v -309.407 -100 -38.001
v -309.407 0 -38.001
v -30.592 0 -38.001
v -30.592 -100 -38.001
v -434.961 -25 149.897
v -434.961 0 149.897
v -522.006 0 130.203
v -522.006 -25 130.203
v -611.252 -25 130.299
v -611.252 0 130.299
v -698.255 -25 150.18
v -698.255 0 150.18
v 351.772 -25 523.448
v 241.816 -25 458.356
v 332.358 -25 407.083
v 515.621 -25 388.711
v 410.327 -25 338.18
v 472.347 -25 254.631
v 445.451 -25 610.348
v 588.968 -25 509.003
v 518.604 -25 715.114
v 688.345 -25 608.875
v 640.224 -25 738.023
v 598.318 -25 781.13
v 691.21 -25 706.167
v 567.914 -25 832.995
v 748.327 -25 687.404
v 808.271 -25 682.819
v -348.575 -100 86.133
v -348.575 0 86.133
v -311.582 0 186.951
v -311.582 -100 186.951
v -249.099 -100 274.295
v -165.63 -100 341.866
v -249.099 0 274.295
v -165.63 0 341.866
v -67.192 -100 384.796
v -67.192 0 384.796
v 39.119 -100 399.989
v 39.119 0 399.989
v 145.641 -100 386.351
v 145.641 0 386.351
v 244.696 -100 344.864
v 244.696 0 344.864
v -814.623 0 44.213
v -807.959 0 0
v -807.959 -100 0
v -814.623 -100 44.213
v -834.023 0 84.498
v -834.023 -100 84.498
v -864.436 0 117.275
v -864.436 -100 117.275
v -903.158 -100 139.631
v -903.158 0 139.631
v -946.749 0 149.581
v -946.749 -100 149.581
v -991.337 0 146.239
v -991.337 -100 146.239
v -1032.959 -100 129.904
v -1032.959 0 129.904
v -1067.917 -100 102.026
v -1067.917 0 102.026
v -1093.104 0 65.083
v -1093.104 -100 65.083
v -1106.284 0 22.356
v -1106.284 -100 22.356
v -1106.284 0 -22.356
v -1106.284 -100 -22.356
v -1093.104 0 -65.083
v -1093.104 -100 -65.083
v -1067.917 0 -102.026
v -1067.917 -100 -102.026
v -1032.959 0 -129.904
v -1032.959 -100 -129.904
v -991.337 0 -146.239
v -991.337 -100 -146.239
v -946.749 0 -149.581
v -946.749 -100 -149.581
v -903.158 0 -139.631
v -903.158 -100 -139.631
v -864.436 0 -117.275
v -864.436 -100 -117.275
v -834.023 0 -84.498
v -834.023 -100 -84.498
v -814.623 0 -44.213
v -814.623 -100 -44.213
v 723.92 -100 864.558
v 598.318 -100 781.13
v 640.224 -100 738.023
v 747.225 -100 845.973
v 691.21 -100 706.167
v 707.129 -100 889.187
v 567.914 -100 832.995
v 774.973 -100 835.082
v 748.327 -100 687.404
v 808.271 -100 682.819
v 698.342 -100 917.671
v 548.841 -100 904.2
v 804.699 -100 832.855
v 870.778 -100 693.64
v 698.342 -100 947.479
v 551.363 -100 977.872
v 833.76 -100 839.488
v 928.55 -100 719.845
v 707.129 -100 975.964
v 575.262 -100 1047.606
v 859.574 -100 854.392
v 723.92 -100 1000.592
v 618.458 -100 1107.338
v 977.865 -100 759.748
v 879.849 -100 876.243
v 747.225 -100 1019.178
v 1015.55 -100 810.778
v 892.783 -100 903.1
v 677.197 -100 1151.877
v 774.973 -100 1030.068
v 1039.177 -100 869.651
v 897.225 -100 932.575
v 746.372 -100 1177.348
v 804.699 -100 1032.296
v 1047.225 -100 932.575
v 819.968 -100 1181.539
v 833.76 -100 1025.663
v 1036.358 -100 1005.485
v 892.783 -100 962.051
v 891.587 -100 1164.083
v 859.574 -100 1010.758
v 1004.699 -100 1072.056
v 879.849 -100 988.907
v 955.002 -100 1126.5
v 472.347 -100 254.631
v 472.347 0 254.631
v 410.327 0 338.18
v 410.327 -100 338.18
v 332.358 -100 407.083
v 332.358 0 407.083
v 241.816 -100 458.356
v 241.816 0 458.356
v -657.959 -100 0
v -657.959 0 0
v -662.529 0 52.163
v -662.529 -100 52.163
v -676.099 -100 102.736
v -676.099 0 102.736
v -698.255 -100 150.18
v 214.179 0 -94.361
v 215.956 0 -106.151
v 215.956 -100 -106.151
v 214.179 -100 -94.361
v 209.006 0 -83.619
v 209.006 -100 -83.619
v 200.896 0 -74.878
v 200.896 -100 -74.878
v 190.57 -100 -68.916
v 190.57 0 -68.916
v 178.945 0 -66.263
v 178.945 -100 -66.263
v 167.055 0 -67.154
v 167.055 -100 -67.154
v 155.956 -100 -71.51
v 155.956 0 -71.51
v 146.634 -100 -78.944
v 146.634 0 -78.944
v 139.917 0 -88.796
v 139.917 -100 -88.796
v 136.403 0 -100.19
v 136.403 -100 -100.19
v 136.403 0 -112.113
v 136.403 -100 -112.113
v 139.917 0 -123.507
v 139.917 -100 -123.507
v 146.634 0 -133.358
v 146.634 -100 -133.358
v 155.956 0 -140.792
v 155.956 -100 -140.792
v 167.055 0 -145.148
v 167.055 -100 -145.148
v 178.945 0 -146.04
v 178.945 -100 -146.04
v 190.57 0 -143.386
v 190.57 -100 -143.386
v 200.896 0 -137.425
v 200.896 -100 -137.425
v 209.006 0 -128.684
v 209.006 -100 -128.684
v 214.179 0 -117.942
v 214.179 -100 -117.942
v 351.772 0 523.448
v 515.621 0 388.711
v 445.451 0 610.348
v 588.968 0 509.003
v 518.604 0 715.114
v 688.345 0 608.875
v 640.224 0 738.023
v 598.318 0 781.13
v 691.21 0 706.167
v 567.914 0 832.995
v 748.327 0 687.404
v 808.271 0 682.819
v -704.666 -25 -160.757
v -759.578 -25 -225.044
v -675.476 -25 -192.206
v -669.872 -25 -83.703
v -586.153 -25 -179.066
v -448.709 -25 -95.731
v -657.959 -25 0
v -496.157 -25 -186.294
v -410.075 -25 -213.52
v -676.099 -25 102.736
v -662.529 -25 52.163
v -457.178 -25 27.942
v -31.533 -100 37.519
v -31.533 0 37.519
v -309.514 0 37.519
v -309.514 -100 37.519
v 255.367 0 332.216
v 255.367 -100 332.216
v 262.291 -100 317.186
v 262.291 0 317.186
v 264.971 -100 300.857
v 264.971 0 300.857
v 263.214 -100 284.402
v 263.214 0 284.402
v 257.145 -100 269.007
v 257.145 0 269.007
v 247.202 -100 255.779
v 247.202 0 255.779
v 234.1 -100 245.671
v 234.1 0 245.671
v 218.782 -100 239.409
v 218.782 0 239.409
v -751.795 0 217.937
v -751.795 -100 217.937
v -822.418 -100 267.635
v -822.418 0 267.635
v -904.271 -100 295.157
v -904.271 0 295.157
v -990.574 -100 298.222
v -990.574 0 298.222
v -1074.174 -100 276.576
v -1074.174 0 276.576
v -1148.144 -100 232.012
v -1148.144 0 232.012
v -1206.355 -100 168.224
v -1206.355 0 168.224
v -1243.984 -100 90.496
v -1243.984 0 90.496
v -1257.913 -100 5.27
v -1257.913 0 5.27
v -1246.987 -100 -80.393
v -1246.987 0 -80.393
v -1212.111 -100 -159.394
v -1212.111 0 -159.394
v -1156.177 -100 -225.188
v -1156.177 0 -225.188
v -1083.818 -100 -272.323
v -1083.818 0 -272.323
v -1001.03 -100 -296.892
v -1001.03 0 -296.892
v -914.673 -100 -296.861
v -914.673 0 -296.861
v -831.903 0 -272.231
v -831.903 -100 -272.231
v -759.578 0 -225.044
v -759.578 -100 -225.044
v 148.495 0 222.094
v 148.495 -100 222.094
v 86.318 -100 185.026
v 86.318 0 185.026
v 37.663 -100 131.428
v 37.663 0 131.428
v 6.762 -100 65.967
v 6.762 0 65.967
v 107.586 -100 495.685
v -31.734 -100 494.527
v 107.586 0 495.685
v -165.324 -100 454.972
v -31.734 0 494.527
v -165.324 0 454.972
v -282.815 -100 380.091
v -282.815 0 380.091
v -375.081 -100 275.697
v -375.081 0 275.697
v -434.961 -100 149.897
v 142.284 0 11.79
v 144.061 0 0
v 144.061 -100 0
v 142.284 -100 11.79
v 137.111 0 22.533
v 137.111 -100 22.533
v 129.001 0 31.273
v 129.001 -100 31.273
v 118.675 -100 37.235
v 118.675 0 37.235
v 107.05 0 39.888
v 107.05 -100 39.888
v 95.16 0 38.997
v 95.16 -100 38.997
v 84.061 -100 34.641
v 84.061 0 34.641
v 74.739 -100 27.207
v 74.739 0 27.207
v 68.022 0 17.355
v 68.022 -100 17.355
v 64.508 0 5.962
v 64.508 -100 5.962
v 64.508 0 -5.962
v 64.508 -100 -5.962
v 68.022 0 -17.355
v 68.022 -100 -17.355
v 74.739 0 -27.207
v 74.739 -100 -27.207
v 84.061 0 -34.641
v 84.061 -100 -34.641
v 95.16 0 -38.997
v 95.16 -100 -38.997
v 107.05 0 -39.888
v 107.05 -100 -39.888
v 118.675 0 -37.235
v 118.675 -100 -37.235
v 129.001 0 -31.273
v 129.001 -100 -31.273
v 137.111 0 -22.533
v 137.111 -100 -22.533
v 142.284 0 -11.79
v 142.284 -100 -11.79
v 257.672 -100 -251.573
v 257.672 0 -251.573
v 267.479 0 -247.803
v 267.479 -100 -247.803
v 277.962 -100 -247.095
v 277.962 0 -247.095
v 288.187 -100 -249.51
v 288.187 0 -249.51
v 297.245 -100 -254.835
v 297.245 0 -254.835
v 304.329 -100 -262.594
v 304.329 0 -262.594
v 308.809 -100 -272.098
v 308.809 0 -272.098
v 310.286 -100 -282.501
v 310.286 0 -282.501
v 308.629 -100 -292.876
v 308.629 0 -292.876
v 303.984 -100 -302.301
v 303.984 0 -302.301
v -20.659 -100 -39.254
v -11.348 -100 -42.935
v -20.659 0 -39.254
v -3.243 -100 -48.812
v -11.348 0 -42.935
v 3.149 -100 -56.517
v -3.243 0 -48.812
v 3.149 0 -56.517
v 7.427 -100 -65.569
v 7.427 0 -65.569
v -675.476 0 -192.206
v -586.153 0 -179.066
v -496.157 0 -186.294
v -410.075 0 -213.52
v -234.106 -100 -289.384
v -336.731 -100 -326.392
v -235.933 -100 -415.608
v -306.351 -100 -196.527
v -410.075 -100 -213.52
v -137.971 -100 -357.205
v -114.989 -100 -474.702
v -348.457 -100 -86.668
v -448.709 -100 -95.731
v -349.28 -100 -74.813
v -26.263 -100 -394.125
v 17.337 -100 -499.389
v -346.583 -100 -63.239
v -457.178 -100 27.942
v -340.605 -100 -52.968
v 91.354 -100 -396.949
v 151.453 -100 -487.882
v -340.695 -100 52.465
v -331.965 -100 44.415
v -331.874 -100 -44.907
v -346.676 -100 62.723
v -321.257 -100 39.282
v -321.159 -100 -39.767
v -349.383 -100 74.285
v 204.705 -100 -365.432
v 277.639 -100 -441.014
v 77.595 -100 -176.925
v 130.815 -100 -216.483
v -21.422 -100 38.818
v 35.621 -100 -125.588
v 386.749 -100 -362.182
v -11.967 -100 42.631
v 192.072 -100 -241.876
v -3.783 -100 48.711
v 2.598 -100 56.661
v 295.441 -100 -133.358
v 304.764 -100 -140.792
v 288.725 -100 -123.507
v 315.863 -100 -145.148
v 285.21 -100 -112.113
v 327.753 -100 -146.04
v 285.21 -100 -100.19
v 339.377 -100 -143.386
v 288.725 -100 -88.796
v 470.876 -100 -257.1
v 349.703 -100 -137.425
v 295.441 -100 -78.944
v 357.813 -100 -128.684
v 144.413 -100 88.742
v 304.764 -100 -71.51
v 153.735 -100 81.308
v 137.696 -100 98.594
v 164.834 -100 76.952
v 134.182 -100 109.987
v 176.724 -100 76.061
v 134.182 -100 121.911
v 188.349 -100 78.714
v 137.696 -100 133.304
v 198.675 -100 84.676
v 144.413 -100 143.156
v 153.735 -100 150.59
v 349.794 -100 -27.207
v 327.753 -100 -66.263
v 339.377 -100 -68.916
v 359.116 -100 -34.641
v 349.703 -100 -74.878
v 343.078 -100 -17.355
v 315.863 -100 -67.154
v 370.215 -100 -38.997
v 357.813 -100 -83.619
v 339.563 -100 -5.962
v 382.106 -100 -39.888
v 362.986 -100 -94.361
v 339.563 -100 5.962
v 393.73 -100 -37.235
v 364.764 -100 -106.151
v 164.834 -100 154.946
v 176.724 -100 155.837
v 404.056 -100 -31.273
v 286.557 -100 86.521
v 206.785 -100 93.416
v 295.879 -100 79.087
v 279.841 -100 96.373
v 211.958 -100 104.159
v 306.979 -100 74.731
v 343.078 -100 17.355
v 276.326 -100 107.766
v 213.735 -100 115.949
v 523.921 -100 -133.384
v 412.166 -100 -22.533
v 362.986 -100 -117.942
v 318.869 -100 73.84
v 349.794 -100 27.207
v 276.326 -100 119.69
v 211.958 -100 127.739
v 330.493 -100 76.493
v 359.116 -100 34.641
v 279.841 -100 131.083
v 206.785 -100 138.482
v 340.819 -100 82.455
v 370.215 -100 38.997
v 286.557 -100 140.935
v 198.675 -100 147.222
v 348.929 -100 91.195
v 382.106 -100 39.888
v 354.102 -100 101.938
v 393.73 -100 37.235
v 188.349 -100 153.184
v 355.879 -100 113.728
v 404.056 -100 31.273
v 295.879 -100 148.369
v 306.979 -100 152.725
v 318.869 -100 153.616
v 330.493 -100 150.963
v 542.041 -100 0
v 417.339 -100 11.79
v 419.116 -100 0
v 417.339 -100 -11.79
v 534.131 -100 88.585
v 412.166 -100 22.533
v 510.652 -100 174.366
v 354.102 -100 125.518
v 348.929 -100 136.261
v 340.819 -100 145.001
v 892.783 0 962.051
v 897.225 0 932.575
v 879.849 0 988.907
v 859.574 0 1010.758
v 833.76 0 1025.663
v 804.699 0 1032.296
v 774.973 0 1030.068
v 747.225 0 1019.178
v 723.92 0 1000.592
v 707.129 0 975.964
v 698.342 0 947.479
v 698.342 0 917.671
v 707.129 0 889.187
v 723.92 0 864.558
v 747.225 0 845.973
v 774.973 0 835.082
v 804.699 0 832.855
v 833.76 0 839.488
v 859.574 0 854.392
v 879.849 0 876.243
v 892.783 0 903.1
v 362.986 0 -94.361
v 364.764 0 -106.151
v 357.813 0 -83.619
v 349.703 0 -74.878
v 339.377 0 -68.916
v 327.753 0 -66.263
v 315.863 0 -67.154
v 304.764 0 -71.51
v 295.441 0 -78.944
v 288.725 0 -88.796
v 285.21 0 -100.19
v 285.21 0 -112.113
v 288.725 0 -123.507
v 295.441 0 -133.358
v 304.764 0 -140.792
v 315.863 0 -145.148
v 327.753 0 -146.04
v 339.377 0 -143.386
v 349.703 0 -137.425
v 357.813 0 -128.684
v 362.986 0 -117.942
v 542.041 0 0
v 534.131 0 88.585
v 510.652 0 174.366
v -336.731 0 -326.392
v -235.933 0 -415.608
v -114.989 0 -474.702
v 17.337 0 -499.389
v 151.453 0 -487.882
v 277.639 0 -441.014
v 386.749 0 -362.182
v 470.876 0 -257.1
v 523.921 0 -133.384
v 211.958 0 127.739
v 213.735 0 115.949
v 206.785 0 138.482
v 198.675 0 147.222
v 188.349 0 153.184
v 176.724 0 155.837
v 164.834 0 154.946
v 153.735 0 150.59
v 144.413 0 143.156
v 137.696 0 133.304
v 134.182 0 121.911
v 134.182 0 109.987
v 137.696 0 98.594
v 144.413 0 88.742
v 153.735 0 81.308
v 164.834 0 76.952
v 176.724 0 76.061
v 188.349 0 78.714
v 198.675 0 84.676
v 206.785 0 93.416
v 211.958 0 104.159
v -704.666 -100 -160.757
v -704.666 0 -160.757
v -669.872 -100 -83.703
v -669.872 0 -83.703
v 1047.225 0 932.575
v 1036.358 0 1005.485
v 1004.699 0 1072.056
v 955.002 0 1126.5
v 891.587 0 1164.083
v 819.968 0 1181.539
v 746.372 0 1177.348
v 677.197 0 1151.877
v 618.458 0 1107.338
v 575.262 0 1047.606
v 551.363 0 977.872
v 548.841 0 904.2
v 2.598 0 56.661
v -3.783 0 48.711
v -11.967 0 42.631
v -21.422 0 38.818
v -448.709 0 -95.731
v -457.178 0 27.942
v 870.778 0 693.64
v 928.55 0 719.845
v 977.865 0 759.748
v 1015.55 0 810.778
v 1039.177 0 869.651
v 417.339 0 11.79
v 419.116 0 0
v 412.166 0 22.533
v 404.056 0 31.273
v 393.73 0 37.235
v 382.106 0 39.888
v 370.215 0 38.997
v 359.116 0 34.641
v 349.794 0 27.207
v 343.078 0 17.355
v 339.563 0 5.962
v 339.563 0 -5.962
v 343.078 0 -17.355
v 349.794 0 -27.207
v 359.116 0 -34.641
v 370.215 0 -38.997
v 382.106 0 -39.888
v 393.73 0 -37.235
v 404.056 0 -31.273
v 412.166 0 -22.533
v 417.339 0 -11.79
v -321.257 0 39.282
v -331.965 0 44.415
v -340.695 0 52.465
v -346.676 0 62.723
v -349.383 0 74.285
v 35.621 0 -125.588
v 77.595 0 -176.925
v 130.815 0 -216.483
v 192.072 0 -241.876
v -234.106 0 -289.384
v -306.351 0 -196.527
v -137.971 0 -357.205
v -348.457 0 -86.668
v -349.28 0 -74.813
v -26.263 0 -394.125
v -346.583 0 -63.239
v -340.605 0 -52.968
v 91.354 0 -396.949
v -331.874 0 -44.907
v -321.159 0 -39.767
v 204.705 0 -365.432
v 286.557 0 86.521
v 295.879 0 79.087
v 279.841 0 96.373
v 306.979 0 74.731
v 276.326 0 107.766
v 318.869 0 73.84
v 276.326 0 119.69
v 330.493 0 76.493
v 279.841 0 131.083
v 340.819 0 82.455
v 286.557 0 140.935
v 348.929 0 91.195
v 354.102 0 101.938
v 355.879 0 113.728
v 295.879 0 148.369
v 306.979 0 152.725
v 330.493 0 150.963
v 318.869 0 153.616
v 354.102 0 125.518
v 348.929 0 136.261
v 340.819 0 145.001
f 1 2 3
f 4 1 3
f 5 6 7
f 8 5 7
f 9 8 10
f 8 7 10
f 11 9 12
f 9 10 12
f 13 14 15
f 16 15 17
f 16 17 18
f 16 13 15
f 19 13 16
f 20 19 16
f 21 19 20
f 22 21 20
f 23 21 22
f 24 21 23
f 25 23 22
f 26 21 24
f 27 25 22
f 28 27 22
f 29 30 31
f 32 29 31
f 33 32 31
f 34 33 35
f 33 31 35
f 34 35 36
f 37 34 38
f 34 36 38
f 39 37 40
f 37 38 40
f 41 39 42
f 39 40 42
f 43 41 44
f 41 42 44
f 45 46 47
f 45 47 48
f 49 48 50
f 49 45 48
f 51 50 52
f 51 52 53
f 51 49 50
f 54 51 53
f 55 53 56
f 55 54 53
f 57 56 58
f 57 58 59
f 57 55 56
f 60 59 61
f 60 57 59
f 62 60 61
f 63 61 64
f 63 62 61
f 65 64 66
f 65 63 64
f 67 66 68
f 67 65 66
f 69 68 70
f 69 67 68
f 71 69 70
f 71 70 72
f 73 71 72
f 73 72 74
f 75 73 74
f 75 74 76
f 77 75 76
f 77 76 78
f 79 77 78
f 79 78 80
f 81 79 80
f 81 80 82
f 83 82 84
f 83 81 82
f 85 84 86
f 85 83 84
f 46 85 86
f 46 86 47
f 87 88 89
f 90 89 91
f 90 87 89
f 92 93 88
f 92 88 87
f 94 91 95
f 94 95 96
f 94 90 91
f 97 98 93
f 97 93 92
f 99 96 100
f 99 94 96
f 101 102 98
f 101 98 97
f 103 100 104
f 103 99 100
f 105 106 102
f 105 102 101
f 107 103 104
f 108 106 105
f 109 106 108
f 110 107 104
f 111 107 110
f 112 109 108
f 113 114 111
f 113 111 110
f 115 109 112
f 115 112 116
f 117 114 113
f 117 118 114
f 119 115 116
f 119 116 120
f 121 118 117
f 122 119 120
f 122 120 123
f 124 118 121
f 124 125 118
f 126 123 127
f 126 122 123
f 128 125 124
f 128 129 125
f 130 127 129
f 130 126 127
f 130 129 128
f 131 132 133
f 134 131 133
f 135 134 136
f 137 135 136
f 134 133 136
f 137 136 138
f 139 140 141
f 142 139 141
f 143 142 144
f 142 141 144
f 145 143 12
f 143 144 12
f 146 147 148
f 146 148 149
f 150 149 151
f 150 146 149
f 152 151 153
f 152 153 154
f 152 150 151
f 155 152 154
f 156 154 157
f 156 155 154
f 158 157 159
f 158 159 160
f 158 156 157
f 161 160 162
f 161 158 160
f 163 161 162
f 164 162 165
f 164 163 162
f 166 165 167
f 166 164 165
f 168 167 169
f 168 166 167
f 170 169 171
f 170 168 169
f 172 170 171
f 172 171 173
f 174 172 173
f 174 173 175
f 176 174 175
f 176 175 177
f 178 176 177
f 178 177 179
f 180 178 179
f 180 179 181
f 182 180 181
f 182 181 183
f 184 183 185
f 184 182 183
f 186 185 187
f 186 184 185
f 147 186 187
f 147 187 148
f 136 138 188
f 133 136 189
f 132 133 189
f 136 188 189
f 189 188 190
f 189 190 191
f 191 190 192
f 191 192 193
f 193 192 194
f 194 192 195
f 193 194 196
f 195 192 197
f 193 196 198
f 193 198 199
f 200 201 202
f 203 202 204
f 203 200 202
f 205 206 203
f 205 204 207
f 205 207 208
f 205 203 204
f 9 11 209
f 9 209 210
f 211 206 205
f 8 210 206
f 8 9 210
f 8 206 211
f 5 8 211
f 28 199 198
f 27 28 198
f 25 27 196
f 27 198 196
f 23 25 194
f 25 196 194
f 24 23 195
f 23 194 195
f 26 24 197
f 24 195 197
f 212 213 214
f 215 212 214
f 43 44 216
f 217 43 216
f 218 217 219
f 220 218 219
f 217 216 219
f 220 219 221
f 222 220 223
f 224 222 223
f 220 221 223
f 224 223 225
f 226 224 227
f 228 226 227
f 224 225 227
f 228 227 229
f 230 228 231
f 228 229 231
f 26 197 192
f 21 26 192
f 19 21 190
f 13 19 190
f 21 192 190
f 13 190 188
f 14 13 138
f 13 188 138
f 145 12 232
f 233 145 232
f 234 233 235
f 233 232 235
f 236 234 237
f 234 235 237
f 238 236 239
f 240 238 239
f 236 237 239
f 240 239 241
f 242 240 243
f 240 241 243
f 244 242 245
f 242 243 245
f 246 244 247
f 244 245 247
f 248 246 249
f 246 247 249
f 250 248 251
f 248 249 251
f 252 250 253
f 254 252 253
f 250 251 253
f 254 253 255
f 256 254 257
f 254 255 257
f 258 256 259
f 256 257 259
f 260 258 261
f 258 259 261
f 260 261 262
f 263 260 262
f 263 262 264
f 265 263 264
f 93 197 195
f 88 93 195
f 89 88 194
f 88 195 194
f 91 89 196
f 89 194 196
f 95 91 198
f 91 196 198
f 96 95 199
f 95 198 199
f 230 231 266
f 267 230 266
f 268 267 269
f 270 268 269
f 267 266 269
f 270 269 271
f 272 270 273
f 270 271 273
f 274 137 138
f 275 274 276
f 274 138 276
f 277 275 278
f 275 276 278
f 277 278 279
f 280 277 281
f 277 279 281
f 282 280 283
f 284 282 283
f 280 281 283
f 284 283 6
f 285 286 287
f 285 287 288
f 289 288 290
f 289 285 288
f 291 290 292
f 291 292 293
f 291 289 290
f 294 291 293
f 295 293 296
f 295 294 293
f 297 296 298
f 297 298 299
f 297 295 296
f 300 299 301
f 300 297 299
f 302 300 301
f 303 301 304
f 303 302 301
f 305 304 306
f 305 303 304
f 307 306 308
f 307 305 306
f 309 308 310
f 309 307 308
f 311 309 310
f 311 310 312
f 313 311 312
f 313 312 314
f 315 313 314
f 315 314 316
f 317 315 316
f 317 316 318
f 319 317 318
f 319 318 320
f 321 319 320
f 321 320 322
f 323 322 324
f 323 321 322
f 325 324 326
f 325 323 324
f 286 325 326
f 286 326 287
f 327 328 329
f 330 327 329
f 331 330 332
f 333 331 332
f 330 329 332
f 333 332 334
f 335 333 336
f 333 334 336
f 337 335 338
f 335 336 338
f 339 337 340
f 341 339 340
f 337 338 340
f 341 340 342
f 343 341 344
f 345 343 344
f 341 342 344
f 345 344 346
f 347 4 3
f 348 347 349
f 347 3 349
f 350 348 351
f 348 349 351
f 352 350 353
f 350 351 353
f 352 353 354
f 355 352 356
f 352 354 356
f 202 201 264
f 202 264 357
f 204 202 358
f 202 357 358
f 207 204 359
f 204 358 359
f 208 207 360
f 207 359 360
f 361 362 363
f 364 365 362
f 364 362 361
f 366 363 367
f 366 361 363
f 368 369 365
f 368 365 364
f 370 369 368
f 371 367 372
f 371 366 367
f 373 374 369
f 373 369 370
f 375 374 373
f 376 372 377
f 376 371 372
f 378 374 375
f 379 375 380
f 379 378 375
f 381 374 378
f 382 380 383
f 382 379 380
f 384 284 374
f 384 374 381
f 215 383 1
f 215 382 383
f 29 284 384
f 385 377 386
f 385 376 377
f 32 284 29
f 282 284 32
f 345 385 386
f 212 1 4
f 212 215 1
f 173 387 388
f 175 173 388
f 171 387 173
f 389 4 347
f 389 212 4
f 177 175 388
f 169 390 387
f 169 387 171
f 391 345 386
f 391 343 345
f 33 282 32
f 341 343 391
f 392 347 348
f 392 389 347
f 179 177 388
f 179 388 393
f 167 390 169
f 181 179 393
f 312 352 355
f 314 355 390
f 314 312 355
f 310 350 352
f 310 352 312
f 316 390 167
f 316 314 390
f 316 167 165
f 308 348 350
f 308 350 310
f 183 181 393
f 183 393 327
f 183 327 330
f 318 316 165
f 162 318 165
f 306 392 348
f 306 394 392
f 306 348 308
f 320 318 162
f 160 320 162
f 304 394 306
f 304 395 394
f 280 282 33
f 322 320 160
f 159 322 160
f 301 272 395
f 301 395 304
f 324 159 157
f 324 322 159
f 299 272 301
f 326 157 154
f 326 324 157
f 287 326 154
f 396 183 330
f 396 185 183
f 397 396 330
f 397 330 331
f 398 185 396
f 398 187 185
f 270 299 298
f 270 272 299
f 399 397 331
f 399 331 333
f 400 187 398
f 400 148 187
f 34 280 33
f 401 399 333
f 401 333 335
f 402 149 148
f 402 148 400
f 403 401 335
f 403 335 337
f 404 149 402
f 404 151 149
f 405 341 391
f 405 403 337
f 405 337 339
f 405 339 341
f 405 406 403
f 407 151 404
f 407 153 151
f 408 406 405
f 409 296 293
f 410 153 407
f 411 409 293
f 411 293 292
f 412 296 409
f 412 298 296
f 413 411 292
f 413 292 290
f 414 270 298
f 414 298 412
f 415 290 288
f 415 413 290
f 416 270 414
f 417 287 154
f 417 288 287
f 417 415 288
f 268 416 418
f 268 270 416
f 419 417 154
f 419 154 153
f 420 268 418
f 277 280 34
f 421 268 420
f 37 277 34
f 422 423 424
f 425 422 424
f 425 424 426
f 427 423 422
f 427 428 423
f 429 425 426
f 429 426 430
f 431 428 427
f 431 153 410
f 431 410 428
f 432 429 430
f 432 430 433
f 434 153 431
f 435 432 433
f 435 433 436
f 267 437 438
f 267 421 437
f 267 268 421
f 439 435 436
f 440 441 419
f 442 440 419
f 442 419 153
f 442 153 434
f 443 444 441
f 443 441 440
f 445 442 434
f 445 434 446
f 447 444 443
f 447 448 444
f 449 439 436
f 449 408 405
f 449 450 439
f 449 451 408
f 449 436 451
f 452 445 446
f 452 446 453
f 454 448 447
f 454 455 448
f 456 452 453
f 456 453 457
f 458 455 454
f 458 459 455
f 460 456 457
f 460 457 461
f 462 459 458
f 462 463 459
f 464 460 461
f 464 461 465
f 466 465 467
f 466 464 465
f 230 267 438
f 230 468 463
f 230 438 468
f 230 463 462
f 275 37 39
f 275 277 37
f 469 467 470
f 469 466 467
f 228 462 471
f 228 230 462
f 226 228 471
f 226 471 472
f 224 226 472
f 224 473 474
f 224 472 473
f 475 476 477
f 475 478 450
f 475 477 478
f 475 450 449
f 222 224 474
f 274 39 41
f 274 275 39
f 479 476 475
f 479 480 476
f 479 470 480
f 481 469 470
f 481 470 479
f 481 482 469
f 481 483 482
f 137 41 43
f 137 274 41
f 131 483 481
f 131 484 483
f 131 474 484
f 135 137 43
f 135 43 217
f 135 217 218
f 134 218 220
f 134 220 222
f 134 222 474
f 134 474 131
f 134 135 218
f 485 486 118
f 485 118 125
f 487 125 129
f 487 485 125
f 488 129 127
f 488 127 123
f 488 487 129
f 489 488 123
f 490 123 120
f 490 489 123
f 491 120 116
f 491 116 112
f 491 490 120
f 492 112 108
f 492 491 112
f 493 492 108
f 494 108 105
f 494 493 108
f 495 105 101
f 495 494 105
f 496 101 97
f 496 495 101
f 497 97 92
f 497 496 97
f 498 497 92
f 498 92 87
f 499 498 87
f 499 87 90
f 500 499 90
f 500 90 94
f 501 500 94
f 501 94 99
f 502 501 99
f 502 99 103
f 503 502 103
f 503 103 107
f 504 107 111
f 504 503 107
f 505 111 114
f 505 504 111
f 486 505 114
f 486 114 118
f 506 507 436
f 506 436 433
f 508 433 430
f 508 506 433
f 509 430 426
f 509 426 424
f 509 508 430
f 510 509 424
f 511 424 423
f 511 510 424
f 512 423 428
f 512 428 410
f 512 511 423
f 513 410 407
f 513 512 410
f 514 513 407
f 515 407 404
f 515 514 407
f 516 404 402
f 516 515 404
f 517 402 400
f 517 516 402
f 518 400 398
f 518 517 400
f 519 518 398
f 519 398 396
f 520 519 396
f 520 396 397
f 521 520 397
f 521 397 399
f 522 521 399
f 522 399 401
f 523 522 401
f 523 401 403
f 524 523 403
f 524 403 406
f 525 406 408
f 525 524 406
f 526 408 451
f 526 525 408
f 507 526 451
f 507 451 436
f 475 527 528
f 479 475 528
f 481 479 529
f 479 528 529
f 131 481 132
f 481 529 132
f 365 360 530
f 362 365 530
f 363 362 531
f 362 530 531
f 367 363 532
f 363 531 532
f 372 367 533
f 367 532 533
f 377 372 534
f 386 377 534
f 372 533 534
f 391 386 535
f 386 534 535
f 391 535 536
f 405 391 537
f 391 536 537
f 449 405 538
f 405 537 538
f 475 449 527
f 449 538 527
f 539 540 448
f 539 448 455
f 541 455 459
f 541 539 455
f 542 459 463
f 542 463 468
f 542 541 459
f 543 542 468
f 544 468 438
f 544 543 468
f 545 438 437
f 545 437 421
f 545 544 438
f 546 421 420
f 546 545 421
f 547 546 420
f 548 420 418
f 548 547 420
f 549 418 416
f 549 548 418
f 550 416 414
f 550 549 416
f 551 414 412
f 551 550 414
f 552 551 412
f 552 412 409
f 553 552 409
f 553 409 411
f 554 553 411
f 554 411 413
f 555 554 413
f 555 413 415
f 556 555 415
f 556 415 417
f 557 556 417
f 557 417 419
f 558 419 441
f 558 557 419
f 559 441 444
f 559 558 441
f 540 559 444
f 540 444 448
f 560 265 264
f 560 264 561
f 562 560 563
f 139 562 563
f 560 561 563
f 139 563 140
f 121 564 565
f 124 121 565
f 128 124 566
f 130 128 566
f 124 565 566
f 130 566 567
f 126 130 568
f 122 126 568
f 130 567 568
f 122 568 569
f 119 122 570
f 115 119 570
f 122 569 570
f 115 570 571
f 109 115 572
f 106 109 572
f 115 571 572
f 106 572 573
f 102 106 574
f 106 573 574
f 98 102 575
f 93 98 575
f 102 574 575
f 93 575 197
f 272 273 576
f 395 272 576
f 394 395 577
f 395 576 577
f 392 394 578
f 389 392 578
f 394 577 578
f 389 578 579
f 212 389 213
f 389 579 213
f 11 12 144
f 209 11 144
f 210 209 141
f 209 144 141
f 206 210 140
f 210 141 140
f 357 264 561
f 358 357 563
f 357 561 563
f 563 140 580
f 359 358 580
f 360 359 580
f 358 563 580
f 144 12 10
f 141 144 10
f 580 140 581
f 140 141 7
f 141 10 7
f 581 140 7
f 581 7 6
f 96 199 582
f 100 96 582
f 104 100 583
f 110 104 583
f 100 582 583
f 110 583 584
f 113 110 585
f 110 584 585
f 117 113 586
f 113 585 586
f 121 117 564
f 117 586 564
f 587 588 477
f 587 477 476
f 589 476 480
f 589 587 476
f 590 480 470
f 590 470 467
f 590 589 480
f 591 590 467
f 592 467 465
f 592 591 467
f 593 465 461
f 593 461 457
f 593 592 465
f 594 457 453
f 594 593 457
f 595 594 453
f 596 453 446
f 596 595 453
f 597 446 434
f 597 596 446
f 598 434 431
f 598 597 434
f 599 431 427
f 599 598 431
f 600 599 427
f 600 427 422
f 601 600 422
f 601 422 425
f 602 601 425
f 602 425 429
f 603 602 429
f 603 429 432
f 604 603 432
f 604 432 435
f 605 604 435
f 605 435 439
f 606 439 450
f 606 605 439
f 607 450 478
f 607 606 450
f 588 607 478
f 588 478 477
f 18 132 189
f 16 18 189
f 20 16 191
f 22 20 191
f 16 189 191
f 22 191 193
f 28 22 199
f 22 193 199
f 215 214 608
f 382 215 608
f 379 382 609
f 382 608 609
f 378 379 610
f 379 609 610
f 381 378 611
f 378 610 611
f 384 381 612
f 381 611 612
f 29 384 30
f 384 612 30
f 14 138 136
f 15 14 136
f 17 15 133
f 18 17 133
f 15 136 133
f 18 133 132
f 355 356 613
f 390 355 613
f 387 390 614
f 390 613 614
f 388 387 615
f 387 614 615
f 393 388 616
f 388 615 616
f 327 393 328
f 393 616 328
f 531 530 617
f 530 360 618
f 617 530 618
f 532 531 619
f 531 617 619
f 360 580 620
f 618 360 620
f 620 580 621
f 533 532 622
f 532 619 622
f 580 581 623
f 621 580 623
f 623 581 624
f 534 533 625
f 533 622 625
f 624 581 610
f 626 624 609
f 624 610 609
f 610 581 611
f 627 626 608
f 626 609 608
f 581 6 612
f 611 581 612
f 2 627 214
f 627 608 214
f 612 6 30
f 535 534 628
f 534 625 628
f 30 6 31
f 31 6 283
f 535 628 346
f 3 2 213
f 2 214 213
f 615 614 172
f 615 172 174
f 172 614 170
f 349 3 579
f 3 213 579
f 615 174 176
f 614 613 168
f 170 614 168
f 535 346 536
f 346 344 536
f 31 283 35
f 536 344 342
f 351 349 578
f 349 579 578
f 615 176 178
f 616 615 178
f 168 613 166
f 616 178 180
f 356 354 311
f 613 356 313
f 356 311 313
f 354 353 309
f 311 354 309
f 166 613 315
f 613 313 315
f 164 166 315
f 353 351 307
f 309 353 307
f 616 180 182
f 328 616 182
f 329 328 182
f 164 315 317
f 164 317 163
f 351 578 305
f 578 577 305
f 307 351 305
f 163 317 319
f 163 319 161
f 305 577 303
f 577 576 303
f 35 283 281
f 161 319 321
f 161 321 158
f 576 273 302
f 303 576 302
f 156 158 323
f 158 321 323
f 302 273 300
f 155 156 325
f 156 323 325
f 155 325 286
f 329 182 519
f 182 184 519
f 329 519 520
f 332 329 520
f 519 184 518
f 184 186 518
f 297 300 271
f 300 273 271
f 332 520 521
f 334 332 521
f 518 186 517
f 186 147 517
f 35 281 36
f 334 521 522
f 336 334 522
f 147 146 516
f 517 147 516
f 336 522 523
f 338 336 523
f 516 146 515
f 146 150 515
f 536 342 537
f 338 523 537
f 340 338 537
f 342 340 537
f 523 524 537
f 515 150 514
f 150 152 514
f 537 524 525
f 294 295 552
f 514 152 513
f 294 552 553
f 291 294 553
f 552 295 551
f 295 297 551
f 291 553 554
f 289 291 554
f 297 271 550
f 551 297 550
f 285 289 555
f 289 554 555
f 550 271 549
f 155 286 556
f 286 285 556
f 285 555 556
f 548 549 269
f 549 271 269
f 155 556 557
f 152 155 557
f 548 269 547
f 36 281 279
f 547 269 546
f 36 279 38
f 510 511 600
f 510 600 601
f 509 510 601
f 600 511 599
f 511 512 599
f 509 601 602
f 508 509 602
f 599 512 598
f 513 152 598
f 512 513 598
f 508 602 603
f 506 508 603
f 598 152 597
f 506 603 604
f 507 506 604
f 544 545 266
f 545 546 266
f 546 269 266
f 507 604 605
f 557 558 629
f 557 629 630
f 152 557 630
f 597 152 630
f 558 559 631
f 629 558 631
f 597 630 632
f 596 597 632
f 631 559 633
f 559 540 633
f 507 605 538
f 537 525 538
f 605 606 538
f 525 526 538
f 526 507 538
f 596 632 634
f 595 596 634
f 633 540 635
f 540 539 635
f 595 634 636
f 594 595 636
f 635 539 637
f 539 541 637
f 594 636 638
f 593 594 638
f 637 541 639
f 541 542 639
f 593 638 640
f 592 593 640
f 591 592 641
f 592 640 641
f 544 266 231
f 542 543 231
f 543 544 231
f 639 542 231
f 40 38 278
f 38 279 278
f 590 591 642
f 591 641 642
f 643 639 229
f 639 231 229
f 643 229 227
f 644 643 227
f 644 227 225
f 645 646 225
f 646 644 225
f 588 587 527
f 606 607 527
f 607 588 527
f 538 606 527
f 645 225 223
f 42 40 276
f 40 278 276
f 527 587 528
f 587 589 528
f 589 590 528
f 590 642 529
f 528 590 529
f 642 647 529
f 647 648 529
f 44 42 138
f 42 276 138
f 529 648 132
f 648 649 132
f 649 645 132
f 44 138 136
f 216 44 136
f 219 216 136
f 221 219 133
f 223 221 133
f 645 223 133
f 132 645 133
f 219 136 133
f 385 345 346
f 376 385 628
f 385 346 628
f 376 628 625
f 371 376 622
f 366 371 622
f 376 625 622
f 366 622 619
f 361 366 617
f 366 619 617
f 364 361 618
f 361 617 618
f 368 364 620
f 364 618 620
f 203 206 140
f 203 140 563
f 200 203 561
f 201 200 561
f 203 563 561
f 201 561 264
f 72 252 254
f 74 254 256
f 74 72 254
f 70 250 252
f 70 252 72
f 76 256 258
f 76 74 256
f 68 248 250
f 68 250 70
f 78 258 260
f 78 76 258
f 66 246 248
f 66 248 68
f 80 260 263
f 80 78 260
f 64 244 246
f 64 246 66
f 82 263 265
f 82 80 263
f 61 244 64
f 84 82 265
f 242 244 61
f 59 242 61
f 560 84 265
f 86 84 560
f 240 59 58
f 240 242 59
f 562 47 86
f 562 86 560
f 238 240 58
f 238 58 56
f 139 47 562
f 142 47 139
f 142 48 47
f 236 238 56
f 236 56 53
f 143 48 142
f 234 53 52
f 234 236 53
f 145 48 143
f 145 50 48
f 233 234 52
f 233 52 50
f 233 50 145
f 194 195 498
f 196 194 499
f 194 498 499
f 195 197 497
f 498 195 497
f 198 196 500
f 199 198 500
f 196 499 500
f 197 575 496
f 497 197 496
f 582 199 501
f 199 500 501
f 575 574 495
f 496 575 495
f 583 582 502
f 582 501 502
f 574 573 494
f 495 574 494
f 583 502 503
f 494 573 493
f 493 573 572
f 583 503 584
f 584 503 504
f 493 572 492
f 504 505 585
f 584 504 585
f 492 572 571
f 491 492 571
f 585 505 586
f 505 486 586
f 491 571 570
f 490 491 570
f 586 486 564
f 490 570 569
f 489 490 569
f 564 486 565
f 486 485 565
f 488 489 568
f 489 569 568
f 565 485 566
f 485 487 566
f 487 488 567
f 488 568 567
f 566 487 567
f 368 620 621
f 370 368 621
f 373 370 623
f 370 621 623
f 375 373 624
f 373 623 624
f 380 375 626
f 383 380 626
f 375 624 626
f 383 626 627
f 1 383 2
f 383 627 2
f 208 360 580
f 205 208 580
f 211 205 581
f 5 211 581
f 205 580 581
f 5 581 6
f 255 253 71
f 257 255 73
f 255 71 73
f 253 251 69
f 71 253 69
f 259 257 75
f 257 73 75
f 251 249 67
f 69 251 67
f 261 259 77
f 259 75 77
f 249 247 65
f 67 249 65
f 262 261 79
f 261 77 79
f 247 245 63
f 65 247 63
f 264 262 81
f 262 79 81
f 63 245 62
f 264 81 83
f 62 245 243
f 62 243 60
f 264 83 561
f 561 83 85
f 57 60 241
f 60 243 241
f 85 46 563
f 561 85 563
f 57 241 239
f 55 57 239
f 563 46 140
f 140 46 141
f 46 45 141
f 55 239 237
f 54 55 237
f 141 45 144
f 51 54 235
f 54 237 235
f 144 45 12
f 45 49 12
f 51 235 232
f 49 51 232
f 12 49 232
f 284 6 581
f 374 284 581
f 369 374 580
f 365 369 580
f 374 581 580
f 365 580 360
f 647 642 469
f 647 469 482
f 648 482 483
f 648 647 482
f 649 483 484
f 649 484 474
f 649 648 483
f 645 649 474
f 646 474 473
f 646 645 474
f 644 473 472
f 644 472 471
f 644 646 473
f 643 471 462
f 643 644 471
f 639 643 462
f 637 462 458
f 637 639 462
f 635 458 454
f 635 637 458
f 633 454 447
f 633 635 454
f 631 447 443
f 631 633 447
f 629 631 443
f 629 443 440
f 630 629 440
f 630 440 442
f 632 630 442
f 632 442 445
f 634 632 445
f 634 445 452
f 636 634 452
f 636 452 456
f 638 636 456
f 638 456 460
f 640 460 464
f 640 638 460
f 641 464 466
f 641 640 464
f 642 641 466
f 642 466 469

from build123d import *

# Parameters (mm, degrees)
F0_R     = 100
F0_R_2   = 40
F0_R_3   = 150
F1_DEPTH = 100
F2_DEPTH = 25


with BuildPart() as f1:
    # F0 (on Front) → F1 (new body)
    with BuildSketch(Plane.XZ):
        with BuildLine():
            ThreePointArc((1047.225497, 932.575154), (746.371976, 1177.348354), (567.914142, 832.994522))
            ThreePointArc((567.914142, 832.994522), (664.756142, 720.556593), (808.271147, 682.819286))
            ThreePointArc((808.271147, 682.819286), (977.865211, 759.747801), (1047.225497, 932.575154))
        make_face()
        with Locations((797.225497, 932.575154)):
            Circle(F0_R, mode=Mode.SUBTRACT)
        with BuildLine():
            ThreePointArc((241.815581, 458.355897), (-165.324477, 454.972029), (-434.960902, 149.897161))
            ThreePointArc((-434.960902, 149.897161), (-456.790816, -34.158339), (-410.075304, -213.520076))
            ThreePointArc((-410.075304, -213.520076), (151.452714, -487.882243), (542.041028, 0))
            ThreePointArc((542.041028, 0), (524.302782, 131.998484), (472.346628, 254.631283))
            ThreePointArc((472.346628, 254.631283), (373.139472, 374.664944), (241.815581, 458.355897))
        make_face()
        with BuildLine():
            ThreePointArc((-348.456891, -86.66819), (-340.605439, -52.968121), (-309.407099, -38.001371))
            Line((-309.407099, -38.001371), (-30.592021, -38.001371))
            ThreePointArc((-30.592021, -38.001371), (-7.111254, -45.61845), (7.42677, -65.568692))
            ThreePointArc((7.42677, -65.568692), (102.985935, -198.344216), (257.671505, -251.572669))
            ThreePointArc((257.671505, -251.572669), (301.078235, -258.448966), (303.984206, -302.300796))
            ThreePointArc((303.984206, -302.300796), (-83.481622, -379.794766), (-348.456891, -86.66819))
        make_face(mode=Mode.SUBTRACT)
        with Locations((175.95619, -106.15138)):
            Circle(F0_R_2, mode=Mode.SUBTRACT)
        with Locations((324.763507, -106.15138)):
            Circle(F0_R_2, mode=Mode.SUBTRACT)
        with Locations((104.061022, 0)):
            Circle(F0_R_2, mode=Mode.SUBTRACT)
        with Locations((173.735186, 115.949109)):
            Circle(F0_R_2, mode=Mode.SUBTRACT)
        with Locations((379.116327, 0)):
            Circle(F0_R_2, mode=Mode.SUBTRACT)
        with Locations((315.879494, 113.728099)):
            Circle(F0_R_2, mode=Mode.SUBTRACT)
        with BuildLine():
            ThreePointArc((-348.575385, 86.13256), (-117.85863, 366.649832), (244.695554, 344.863948))
            ThreePointArc((244.695554, 344.863948), (263.21358, 284.40211), (218.781874, 239.409059))
            ThreePointArc((218.781874, 239.409059), (86.318197, 185.025546), (6.762126, 65.966637))
            ThreePointArc((6.762126, 65.966637), (-7.680648, 45.409285), (-31.533251, 37.519304))
            Line((-31.533251, 37.519304), (-309.513744, 37.519304))
            ThreePointArc((-309.513744, 37.519304), (-340.69491, 52.464666), (-348.575385, 86.13256))
        make_face(mode=Mode.SUBTRACT)
        with BuildLine():
            ThreePointArc((-657.958972, 0), (-668.208095, 77.745926), (-698.255166, 150.179668))
            ThreePointArc((-698.255166, 150.179668), (-1254.031116, 48.386834), (-759.577695, -225.044148))
            ThreePointArc((-759.577695, -225.044148), (-684.541358, -123.461769), (-657.958972, 0))
        make_face()
        with Locations((-957.958972, 0)):
            Circle(F0_R_3, mode=Mode.SUBTRACT)
    extrude(amount=F1_DEPTH)


with BuildPart() as f2:
    # F0 (on Front) → F2 (new body)
    with BuildSketch(Plane.XZ):
        with BuildLine():
            ThreePointArc((-434.960902, 149.897161), (-566.631945, 127.753946), (-698.255166, 150.179668))
            ThreePointArc((-698.255166, 150.179668), (-668.208095, 77.745926), (-657.958972, 0))
            ThreePointArc((-657.958972, 0), (-684.541358, -123.461769), (-759.577695, -225.044148))
            ThreePointArc((-759.577695, -225.044148), (-586.152532, -179.066137), (-410.075304, -213.520076))
            ThreePointArc((-410.075304, -213.520076), (-456.790816, -34.158339), (-434.960902, 149.897161))
        make_face()
        with BuildLine():
            ThreePointArc((567.914142, 832.994522), (445.450703, 610.347873), (241.815581, 458.355897))
            ThreePointArc((241.815581, 458.355897), (373.139472, 374.664944), (472.346628, 254.631283))
            ThreePointArc((472.346628, 254.631283), (588.968218, 509.003362), (808.271147, 682.819286))
            ThreePointArc((808.271147, 682.819286), (664.756142, 720.556593), (567.914142, 832.994522))
        make_face()
    extrude(amount=F2_DEPTH)


solid = Compound([f1.part, f2.part])
